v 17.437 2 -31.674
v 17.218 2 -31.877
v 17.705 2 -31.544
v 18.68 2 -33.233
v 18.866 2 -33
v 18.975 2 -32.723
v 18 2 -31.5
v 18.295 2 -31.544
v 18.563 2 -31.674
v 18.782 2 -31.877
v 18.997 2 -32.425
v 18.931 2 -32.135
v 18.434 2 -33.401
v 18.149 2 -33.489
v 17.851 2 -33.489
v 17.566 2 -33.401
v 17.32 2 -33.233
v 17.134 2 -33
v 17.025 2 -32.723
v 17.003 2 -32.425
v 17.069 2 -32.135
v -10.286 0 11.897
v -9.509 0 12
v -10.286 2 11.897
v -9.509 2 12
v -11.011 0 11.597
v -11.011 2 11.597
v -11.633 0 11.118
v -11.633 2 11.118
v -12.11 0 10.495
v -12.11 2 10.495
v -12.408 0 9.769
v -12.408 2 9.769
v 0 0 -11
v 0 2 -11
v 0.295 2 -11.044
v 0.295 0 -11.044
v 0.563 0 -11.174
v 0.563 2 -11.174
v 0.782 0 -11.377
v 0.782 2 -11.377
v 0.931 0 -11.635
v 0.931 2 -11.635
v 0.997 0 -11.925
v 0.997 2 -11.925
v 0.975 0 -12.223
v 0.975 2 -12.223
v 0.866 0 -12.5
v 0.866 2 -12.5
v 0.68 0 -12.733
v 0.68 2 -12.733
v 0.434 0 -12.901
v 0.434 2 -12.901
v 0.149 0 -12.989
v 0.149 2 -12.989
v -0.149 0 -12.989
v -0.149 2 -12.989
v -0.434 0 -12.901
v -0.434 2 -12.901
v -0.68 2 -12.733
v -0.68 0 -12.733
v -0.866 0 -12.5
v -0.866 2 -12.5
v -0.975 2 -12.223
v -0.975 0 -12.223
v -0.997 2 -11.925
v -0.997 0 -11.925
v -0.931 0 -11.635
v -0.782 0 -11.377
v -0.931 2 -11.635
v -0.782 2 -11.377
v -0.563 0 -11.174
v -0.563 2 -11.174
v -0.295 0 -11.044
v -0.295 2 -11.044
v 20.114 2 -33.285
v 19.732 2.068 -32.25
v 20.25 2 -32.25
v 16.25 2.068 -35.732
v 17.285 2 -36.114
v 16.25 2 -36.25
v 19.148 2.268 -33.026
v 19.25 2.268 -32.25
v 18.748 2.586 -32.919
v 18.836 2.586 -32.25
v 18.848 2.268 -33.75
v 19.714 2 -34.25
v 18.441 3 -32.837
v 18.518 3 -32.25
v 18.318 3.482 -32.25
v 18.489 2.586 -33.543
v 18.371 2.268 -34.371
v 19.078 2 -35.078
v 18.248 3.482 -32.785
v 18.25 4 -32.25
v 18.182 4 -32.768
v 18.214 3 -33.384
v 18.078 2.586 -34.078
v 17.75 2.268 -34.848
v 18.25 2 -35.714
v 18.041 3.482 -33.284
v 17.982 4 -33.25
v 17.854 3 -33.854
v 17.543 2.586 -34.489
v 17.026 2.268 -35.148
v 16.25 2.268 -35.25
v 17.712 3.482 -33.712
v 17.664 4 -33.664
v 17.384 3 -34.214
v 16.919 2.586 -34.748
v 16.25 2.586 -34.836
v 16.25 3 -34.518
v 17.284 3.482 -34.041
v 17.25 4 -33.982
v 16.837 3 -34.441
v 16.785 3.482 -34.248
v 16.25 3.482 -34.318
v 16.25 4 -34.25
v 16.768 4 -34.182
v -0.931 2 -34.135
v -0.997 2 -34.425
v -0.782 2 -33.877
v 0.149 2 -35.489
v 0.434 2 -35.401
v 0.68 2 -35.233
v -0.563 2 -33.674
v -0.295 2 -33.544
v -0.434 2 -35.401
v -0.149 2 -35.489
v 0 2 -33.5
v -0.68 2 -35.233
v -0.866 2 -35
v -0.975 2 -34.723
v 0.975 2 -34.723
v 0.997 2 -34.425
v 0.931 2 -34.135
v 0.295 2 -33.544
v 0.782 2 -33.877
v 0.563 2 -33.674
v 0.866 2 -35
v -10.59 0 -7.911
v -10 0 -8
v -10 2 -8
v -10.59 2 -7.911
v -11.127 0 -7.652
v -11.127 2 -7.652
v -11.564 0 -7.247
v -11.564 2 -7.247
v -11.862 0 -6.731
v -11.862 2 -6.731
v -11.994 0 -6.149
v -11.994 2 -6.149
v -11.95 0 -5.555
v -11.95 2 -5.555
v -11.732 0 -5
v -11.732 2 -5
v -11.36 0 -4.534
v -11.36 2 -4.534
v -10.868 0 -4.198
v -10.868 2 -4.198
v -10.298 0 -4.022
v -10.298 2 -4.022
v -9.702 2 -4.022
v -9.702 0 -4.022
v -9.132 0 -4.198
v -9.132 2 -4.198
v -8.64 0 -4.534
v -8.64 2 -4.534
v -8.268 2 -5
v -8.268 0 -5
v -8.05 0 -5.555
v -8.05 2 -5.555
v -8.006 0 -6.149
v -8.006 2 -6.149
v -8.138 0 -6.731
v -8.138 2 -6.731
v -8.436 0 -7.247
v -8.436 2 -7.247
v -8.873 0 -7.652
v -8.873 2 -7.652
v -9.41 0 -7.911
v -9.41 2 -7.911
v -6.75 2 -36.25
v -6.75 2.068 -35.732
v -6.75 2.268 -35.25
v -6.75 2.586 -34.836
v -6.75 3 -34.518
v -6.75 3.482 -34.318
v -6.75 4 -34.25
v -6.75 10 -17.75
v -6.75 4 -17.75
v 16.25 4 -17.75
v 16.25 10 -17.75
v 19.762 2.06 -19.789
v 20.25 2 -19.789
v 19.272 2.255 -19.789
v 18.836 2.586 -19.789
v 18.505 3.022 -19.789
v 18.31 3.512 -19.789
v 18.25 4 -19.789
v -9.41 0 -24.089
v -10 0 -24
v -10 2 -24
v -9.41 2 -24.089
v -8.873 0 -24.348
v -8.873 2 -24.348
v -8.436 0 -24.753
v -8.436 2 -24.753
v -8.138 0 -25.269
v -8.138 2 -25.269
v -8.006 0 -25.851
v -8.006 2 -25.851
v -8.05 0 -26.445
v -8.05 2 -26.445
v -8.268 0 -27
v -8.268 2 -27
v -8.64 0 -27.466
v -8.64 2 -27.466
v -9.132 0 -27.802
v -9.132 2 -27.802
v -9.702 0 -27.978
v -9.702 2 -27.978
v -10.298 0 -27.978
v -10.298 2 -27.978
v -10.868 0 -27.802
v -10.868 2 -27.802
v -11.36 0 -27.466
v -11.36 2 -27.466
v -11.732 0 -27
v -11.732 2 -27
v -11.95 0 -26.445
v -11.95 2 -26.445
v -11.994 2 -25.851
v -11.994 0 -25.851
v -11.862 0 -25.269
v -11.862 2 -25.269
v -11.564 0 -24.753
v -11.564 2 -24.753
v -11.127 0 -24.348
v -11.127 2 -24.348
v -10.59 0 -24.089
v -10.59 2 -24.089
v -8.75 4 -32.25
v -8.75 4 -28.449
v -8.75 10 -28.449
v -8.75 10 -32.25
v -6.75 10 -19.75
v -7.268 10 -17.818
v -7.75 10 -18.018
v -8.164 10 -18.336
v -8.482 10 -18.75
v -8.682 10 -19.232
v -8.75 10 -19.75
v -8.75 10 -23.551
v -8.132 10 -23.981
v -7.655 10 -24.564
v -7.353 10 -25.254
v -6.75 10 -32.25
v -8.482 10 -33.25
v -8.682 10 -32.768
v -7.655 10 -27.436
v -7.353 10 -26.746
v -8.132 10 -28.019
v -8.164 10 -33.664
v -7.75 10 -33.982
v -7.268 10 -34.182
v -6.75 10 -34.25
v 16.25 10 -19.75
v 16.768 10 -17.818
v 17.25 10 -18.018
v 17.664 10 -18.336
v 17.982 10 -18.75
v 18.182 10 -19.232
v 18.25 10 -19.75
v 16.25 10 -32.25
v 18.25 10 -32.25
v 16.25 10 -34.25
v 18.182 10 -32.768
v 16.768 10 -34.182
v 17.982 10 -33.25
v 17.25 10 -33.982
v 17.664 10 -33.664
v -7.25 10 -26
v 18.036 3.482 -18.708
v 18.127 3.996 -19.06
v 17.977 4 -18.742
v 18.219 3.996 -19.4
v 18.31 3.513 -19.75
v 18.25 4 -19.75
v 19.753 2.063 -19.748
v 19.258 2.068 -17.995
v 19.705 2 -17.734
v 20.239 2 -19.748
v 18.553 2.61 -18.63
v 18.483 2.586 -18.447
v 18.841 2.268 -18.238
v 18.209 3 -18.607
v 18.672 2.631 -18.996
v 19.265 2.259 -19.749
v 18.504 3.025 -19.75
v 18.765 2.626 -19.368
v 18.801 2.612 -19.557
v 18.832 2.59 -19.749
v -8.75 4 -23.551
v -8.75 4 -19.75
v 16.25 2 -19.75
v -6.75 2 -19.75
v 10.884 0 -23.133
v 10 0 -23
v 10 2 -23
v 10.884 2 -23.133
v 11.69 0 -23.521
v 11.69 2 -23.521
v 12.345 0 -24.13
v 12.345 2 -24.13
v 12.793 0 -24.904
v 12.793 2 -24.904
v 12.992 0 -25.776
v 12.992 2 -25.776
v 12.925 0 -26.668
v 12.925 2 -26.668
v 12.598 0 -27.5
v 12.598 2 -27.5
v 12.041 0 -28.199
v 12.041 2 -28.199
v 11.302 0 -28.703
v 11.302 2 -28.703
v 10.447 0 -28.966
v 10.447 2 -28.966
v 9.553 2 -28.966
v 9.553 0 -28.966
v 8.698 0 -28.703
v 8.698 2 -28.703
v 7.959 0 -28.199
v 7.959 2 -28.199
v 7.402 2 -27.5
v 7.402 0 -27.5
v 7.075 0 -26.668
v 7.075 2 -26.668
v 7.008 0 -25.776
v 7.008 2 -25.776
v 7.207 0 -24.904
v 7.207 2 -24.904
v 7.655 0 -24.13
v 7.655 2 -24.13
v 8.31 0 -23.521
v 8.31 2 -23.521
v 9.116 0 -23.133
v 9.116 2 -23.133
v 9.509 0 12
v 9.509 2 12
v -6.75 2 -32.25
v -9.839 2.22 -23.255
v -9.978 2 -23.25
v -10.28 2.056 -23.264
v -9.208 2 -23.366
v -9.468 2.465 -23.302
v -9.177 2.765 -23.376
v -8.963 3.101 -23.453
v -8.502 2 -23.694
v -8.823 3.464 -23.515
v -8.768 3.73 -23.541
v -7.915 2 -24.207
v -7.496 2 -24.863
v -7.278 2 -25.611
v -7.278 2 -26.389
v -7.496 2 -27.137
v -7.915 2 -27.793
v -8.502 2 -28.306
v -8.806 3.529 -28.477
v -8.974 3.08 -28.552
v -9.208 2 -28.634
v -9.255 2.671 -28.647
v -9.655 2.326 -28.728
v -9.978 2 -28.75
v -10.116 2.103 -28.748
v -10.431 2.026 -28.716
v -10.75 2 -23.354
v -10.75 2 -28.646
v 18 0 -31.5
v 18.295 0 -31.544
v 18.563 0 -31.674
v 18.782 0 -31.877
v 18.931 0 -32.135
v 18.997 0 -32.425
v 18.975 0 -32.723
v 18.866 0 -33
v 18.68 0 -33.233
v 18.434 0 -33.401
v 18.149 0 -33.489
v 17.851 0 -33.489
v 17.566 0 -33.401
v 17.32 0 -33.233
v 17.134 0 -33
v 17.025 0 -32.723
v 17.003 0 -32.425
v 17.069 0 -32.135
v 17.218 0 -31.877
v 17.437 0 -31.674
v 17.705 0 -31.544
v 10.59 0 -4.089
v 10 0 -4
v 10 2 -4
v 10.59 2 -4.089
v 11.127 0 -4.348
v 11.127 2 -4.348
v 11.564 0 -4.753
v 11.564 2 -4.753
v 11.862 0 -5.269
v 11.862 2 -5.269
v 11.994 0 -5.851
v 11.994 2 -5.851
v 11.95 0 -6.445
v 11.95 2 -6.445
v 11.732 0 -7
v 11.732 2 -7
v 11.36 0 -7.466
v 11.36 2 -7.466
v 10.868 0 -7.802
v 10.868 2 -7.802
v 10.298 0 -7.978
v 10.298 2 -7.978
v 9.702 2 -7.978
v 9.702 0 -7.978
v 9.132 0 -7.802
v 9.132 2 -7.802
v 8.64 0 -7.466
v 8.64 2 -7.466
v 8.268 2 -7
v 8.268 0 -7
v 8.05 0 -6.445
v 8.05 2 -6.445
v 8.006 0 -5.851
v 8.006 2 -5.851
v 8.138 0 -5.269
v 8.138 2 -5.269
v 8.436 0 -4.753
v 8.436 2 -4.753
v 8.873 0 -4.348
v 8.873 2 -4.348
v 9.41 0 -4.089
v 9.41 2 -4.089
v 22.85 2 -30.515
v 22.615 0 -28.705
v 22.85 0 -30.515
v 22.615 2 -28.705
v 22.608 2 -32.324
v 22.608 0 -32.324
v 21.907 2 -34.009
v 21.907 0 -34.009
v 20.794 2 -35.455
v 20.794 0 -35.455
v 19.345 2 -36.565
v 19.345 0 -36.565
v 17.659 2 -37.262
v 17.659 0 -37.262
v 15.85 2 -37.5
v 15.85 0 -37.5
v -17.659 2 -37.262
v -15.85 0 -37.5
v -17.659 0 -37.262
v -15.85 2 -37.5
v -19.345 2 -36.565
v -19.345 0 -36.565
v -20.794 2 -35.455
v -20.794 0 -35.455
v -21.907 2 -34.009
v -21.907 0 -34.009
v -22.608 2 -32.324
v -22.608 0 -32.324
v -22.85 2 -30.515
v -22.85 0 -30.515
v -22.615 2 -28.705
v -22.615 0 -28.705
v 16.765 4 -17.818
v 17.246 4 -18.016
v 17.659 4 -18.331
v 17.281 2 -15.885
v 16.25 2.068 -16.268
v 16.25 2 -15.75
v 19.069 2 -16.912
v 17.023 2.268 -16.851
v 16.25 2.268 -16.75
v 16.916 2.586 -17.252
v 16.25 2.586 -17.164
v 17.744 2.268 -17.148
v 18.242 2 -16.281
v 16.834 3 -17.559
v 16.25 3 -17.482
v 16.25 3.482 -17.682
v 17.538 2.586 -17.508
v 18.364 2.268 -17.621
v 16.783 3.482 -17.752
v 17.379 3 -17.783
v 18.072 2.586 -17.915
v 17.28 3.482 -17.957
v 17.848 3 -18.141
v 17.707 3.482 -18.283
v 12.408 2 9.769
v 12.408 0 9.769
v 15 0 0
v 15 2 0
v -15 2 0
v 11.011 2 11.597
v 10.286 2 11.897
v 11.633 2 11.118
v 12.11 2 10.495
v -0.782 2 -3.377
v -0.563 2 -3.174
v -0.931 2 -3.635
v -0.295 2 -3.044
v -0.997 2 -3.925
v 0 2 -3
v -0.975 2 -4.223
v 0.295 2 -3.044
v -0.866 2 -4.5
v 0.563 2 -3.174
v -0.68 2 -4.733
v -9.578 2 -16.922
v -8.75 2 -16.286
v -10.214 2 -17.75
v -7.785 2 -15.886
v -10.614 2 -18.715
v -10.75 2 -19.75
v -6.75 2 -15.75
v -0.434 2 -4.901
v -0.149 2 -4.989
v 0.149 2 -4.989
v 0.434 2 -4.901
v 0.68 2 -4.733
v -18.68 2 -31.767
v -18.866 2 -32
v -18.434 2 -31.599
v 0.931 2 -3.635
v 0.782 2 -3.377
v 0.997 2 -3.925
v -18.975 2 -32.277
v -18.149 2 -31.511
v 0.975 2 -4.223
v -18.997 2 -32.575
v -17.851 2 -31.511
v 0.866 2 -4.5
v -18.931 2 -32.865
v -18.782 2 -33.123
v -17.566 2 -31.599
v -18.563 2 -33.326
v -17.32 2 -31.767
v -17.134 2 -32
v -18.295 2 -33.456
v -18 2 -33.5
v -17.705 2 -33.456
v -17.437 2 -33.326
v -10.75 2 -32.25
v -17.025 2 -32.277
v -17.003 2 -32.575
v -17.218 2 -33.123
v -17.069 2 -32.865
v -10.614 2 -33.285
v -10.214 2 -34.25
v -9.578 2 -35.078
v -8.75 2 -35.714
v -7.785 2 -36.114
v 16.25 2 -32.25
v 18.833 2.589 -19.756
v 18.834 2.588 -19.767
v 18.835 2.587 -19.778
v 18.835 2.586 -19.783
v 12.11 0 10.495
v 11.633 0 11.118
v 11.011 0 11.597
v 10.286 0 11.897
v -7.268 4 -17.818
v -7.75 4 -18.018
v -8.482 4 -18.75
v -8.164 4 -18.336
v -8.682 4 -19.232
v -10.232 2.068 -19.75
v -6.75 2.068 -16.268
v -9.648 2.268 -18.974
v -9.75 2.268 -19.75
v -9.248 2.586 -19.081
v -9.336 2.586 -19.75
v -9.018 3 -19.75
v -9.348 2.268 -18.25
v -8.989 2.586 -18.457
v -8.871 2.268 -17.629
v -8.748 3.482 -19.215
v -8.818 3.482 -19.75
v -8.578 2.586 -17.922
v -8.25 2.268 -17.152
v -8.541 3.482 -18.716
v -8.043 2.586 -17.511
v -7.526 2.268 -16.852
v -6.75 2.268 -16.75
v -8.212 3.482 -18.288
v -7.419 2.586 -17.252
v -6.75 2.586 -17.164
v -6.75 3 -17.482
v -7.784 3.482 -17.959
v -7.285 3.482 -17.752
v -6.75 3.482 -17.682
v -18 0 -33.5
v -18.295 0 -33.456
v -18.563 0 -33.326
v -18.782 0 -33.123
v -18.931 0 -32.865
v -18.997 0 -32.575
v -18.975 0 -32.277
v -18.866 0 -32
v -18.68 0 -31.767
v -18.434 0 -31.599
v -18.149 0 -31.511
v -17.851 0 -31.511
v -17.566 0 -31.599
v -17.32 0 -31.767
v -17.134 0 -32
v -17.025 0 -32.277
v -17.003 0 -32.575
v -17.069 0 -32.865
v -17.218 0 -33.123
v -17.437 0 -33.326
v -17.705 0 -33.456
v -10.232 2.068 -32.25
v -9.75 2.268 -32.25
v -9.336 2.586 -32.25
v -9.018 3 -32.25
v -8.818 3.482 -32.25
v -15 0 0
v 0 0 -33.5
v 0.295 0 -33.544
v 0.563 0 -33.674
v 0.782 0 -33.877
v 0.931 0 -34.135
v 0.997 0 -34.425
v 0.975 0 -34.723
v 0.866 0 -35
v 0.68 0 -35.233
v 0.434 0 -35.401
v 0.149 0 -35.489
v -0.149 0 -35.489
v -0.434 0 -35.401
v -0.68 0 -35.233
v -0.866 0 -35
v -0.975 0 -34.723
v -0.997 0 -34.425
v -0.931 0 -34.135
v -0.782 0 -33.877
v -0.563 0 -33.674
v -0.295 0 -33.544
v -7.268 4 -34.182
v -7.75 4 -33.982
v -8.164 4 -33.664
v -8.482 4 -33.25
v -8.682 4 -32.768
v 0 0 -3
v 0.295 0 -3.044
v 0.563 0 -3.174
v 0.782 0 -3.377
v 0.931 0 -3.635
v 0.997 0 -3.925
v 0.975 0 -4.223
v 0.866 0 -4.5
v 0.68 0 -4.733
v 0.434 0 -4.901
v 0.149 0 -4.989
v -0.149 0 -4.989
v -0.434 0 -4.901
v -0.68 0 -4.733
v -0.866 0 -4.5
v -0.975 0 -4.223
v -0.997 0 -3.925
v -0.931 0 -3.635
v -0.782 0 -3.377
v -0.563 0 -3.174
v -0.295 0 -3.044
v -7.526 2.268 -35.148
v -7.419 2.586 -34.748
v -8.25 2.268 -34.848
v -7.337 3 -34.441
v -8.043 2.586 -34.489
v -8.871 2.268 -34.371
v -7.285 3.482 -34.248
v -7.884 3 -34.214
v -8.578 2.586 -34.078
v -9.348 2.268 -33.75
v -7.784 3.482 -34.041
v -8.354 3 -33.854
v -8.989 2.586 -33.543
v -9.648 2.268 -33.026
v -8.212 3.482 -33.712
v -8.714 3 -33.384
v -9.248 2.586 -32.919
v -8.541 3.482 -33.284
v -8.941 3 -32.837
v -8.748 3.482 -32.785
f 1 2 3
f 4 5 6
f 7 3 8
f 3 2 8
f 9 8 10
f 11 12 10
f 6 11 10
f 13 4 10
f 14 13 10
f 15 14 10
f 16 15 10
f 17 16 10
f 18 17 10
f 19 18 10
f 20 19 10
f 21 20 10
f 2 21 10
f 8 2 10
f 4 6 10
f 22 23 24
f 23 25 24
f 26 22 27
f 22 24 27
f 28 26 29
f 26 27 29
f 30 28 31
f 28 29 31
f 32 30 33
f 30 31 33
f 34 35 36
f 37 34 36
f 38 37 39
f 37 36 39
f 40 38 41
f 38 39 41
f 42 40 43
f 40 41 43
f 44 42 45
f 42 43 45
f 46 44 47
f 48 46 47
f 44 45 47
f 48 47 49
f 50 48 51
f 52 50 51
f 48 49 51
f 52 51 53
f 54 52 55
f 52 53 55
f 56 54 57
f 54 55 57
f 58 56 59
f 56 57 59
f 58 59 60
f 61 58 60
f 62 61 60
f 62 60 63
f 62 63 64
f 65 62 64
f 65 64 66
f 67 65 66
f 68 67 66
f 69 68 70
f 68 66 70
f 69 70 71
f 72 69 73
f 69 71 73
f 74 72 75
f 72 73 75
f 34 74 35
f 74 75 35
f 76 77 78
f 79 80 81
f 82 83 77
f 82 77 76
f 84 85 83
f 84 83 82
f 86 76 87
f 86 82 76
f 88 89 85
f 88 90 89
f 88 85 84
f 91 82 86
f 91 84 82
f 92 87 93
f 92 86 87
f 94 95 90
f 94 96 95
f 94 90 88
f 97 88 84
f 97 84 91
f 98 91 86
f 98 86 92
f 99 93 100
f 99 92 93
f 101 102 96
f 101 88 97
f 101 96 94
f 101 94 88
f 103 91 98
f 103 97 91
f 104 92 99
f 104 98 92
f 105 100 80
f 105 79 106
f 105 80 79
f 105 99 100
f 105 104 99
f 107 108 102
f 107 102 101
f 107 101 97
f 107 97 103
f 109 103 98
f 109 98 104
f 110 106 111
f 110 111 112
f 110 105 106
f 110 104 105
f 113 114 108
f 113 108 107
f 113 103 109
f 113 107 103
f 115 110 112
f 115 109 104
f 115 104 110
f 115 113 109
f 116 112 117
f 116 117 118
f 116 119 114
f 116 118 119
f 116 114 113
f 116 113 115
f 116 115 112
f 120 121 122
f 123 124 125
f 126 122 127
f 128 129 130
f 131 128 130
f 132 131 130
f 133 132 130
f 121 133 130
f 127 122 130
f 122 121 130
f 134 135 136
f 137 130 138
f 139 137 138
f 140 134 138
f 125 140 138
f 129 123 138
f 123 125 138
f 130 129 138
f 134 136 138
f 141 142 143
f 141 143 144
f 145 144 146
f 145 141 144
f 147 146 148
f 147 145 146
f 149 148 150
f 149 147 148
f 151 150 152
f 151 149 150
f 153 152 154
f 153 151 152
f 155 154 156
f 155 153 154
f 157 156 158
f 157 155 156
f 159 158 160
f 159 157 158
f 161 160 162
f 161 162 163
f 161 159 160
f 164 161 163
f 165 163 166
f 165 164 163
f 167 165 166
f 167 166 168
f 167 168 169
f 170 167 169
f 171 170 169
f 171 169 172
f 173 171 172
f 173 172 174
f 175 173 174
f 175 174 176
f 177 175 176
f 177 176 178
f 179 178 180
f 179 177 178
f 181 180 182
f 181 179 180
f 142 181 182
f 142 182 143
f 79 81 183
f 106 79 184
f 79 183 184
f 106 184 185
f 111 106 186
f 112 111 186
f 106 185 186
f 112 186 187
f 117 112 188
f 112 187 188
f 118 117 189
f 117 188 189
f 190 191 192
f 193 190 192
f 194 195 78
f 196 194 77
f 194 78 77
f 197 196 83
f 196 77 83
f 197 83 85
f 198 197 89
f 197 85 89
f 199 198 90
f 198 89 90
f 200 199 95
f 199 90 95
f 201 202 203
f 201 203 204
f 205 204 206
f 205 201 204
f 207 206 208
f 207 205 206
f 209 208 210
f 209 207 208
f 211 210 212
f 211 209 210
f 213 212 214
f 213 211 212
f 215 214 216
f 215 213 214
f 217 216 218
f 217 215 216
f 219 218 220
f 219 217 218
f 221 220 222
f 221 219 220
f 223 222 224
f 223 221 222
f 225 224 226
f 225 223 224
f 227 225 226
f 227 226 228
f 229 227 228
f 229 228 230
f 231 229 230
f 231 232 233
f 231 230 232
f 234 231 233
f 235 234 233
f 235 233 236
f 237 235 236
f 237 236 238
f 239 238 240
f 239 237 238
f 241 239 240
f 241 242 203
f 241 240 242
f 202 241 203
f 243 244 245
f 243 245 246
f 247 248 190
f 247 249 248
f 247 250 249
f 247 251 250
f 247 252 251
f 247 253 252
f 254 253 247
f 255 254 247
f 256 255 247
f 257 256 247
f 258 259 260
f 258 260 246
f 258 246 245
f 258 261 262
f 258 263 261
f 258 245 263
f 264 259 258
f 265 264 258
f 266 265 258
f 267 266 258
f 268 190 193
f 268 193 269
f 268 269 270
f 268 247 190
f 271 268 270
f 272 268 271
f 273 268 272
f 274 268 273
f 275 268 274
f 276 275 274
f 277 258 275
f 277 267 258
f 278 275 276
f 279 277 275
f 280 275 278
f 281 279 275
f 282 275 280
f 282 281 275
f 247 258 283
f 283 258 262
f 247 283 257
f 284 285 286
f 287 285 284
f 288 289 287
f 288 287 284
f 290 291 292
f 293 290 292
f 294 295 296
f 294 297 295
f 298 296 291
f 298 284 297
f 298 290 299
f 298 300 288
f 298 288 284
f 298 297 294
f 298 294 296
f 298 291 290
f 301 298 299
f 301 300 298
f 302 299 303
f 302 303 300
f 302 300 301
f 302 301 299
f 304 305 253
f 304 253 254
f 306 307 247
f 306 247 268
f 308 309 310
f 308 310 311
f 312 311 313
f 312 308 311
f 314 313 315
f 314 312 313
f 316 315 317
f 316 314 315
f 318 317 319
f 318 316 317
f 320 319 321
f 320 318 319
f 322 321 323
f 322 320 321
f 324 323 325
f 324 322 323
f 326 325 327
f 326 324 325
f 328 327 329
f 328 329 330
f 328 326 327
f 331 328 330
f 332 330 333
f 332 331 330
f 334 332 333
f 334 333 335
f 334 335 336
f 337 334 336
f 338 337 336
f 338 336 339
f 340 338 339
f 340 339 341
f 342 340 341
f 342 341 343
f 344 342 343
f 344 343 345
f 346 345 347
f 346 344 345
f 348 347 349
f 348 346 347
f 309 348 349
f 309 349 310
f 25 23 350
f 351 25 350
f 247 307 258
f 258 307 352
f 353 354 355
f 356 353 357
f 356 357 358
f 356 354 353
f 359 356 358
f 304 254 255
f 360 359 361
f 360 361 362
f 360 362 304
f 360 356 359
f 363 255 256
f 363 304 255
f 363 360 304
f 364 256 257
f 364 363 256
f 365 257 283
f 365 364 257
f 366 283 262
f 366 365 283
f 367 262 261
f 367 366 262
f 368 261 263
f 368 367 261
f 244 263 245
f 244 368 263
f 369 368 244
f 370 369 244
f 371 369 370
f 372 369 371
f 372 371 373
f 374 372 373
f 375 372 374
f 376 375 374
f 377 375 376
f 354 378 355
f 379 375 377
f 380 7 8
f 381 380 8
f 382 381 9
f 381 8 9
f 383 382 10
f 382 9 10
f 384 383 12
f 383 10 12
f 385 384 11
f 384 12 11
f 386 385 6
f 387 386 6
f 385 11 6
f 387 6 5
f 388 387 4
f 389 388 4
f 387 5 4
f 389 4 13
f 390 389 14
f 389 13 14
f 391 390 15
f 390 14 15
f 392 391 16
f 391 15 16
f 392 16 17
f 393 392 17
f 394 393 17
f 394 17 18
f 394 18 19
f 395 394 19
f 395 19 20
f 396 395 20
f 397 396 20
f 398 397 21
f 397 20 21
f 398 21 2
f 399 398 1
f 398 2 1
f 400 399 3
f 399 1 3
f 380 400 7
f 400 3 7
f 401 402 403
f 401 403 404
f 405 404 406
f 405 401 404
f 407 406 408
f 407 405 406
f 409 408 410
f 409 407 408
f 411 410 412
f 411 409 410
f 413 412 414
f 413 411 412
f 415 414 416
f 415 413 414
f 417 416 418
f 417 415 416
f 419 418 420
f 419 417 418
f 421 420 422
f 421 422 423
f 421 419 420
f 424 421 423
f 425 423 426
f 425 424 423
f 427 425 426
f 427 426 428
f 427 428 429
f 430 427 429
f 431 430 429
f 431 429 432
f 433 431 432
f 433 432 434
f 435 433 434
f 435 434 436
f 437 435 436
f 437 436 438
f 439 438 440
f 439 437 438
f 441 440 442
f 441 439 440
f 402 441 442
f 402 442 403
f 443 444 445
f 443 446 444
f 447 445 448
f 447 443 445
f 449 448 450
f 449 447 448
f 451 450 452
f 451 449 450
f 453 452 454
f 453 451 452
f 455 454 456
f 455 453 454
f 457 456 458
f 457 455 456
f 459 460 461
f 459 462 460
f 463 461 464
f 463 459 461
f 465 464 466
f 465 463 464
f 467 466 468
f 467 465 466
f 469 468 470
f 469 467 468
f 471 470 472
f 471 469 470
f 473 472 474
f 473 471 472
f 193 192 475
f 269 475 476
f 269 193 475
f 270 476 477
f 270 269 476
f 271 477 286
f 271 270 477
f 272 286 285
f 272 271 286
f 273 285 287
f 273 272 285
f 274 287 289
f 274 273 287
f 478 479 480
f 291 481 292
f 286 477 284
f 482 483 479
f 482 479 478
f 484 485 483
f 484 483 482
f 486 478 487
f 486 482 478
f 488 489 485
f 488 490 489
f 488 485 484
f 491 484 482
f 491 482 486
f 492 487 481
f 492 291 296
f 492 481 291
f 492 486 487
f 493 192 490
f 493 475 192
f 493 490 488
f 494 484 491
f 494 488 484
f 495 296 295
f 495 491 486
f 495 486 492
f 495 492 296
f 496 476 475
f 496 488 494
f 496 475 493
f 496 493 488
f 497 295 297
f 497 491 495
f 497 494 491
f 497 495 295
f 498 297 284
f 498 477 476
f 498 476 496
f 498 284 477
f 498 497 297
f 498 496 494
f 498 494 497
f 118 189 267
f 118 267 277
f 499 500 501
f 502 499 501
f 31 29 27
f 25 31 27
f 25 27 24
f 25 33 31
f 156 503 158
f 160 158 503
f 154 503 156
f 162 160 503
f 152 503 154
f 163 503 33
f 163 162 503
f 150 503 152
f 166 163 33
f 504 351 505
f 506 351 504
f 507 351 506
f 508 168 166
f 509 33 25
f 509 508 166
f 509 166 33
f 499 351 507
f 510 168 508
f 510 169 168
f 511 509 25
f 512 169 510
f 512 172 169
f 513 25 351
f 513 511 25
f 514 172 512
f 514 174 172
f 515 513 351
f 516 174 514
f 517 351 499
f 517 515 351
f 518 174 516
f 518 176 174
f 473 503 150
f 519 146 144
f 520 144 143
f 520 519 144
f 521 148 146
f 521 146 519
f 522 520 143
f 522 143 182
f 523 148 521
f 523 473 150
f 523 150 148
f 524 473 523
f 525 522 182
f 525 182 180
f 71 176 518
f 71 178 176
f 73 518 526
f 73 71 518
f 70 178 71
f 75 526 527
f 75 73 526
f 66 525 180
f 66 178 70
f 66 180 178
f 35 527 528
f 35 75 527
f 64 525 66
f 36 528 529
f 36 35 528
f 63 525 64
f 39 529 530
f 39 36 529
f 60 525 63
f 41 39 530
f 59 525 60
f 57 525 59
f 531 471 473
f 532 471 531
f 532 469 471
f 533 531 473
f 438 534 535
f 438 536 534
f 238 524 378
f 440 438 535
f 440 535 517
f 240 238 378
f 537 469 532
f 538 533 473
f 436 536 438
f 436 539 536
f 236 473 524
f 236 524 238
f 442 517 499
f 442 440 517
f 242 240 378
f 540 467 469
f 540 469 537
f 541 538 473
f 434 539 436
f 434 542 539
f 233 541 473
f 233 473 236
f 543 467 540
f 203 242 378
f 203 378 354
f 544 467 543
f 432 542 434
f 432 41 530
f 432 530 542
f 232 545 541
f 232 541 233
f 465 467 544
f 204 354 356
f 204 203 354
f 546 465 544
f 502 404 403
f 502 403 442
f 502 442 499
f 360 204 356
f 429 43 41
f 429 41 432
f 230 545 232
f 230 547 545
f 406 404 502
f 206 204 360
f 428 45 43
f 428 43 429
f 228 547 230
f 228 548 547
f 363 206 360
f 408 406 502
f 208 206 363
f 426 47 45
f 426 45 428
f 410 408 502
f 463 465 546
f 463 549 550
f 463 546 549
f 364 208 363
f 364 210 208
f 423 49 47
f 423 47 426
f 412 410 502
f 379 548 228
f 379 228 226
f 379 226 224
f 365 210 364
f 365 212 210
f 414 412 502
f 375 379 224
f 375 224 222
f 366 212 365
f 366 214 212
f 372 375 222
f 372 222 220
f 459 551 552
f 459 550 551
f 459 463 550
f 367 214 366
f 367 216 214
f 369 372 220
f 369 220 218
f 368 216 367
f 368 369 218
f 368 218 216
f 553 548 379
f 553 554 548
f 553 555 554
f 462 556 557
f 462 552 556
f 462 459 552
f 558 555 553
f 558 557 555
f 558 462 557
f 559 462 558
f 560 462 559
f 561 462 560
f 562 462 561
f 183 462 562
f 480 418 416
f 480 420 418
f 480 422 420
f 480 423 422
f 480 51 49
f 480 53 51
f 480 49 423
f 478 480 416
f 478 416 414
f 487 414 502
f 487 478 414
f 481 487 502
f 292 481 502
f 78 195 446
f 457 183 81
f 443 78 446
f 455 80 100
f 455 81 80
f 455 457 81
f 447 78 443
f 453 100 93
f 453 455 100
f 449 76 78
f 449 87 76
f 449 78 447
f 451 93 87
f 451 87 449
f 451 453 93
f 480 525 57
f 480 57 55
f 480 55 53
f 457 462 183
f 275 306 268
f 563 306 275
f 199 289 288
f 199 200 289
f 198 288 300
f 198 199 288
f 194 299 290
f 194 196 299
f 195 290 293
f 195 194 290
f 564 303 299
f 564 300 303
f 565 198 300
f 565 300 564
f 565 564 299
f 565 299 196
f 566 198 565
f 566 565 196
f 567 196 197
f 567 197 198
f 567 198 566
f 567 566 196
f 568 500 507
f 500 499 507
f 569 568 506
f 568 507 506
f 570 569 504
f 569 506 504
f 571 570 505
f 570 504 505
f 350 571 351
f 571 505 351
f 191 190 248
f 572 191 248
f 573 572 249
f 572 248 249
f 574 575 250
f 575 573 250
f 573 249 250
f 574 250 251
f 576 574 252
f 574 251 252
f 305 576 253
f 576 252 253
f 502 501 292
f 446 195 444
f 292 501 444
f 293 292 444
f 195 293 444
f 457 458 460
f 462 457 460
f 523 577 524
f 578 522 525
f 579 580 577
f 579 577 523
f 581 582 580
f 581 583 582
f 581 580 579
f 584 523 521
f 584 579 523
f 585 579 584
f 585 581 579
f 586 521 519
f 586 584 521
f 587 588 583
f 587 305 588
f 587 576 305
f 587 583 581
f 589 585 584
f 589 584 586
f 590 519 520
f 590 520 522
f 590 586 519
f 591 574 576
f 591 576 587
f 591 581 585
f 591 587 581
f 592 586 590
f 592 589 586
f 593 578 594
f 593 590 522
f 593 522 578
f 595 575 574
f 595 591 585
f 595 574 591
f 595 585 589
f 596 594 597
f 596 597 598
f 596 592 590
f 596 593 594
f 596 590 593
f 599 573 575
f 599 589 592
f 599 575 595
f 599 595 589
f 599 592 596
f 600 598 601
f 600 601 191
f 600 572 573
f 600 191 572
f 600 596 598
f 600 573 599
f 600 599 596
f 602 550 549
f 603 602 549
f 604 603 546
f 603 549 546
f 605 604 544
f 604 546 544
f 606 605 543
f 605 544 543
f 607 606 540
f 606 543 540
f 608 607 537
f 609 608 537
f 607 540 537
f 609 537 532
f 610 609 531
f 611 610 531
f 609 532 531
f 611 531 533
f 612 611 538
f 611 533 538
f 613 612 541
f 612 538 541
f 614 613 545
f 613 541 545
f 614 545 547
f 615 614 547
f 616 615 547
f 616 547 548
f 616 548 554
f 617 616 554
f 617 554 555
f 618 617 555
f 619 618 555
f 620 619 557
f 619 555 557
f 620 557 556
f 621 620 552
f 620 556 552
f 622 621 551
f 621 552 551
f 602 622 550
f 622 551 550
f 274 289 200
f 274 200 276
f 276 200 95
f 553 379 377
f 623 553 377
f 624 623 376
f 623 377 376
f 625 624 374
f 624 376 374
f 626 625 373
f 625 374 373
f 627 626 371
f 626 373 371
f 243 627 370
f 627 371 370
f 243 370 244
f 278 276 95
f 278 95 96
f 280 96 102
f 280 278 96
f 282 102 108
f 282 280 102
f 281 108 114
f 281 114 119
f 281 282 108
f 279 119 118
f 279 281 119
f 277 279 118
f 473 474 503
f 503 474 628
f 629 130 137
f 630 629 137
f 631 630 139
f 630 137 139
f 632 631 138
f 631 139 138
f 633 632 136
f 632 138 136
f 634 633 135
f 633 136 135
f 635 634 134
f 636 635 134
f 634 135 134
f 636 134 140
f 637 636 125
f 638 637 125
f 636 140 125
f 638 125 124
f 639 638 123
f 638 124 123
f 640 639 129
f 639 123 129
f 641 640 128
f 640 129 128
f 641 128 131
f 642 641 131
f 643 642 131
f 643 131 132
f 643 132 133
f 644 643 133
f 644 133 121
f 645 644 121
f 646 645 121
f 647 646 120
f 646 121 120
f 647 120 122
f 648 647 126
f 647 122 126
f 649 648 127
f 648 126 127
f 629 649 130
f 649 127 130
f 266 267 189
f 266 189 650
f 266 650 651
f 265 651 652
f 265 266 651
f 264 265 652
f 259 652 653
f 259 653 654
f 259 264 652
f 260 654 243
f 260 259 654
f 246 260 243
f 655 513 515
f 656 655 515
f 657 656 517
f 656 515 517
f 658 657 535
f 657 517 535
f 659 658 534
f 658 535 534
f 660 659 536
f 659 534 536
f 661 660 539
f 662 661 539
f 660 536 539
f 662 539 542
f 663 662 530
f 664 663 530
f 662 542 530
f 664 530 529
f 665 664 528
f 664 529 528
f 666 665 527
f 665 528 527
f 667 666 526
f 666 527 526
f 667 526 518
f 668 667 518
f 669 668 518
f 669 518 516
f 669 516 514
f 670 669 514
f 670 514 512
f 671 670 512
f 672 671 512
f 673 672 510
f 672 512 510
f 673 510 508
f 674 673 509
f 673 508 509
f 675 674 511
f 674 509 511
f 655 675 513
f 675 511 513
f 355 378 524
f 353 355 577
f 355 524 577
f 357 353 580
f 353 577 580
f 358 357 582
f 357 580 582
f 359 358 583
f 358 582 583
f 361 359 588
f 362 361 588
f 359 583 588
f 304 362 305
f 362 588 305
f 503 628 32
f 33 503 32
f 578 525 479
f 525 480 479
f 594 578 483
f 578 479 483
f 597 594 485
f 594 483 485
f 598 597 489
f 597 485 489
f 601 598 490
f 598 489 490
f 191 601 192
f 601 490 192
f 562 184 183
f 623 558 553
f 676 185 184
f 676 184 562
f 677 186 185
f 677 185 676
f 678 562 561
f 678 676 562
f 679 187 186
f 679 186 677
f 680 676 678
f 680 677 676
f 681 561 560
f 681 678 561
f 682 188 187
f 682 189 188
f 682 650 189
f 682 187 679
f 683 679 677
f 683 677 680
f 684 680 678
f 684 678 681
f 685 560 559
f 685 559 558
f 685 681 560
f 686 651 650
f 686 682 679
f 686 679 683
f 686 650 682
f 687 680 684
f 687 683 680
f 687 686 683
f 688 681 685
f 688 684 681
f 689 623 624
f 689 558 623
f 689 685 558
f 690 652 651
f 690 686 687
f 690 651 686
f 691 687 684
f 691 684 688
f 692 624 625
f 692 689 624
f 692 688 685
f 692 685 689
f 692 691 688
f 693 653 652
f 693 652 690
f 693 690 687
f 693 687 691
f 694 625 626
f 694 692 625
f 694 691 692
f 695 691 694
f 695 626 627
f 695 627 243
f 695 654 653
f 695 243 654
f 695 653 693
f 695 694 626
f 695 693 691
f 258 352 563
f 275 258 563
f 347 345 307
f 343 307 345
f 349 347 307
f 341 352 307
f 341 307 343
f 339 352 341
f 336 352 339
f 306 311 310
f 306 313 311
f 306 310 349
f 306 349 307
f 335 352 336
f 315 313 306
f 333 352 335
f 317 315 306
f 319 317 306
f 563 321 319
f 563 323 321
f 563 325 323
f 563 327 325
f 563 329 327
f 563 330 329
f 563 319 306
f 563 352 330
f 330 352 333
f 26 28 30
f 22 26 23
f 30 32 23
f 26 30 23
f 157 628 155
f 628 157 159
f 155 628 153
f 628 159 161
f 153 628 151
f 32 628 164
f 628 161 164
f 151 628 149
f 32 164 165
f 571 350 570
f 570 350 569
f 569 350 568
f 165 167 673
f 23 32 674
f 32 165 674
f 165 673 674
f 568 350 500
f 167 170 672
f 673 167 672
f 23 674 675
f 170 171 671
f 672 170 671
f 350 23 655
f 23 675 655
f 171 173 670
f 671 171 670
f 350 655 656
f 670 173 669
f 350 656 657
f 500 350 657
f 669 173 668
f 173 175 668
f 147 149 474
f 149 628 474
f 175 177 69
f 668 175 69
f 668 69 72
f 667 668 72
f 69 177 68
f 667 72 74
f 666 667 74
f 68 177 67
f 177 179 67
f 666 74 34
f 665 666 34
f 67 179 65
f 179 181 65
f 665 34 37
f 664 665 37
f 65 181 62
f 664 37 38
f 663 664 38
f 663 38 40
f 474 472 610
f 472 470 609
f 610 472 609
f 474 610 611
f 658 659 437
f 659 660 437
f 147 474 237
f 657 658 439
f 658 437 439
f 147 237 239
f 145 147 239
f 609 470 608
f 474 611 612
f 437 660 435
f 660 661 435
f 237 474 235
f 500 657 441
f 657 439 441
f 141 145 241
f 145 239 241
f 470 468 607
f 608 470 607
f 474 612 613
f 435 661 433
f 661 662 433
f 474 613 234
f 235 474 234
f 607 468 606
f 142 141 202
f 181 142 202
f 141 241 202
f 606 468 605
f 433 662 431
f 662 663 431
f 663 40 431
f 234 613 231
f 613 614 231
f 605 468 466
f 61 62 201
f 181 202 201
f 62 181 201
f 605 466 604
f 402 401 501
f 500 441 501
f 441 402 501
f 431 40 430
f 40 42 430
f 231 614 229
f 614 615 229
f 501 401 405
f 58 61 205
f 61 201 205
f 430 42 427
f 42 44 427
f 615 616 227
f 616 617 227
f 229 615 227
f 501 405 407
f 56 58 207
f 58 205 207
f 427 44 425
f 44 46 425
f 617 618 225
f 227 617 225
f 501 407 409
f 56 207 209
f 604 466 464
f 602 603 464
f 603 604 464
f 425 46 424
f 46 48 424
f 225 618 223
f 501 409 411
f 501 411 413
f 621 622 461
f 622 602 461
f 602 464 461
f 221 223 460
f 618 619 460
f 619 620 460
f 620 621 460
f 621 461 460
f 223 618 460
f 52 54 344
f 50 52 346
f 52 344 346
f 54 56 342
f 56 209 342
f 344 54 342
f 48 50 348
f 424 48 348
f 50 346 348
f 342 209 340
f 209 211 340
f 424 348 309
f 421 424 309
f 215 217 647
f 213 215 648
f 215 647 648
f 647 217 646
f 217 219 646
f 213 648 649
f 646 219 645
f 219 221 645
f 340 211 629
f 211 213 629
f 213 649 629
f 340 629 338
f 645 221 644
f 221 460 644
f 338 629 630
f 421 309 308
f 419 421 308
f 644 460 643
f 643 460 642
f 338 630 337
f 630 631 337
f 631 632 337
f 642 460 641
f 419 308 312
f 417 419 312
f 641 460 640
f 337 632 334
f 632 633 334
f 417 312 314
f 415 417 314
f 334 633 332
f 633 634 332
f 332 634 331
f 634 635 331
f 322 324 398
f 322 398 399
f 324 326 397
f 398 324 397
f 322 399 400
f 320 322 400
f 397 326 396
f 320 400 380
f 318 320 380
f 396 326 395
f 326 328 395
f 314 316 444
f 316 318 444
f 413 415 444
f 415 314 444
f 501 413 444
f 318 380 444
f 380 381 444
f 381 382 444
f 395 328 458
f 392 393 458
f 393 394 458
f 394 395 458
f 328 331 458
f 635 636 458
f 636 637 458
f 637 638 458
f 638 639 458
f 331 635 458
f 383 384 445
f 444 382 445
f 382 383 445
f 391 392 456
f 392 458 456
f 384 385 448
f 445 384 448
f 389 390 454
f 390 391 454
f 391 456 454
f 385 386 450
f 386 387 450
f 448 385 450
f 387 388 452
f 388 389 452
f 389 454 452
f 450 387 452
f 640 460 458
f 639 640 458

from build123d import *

# Parameters (mm, degrees)
SKETCH1_R               = 3
SKETCH1_R_2             = 2
BOSS_EXTRUDE1_DEPTH     = 2
FILLET1_R               = 7
SKETCH3_W               = 27
SKETCH3_H               = 16.5
SKETCH3_W_2             = 23
SKETCH3_H_2             = 12.5
BOSS_EXTRUDE2_DEPTH     = 8
FILLET2_R               = 2
FILLET3_R               = 2
SKETCH2_R               = 1
CUT_EXTRUDE1_DEPTH      = 2
CUT_EXTRUDE2_DEPTH      = 45.635758586
CUT_EXTRUDE2_DEPTH_BACK = 45.635758586
SKETCH4_R               = 2
SKETCH5_R               = 2.75
CUT_EXTRUDE3_DEPTH      = 45.635758586
FILLET4_R               = 3


with BuildPart() as part:
    # Sketch1 → Boss-Extrude1 (new body)
    with BuildSketch(Plane(origin=(0, 0, 0), x_dir=(1, 0, 0), z_dir=(0, 1, 0))):
        Polygon((15, 0), (24.948794511, 37.5), (-24.948794511, 37.5), (-15, 0), (-11.816385757, -12), (11.816385757, -12), align=None)
        with Locations(Location((10, 26, 0), (0, 0, 270))):
            Circle(SKETCH1_R, mode=Mode.SUBTRACT)
        with Locations(Location((10, 6, 0), (0, 0, 270))):
            Circle(SKETCH1_R_2, mode=Mode.SUBTRACT)
        with Locations(Location((-10, 6, 0), (0, 0, 90))):
            Circle(SKETCH1_R_2, mode=Mode.SUBTRACT)
    extrude(amount=BOSS_EXTRUDE1_DEPTH)

    # Fillet1
    fillet1_edges = [part.edges().sort_by_distance(p)[0] for p in [
        (-24.948794511, 1, -37.5),
        (24.948794511, 1, -37.5),
    ]]
    fillet(fillet1_edges, radius=FILLET1_R)

    # Sketch3 → Boss-Extrude2 (add)
    with BuildSketch(Plane(origin=(0, 2, 0), x_dir=(1, 0, 0), z_dir=(0, 1, 0))):
        with Locations((4.75, 26)):
            Rectangle(SKETCH3_W, SKETCH3_H)
        with Locations((4.75, 26)):
            Rectangle(SKETCH3_W_2, SKETCH3_H_2, mode=Mode.SUBTRACT)
    extrude(amount=BOSS_EXTRUDE2_DEPTH)

    # Fillet2
    fillet2_edges = [part.edges().sort_by_distance(p)[0] for p in [
        (-8.75, 6, -34.25),
        (-8.75, 6, -17.75),
        (18.25, 6, -17.75),
        (18.25, 6, -34.25),
    ]]
    fillet(fillet2_edges, radius=FILLET2_R)

    # Fillet3
    fillet3_edges = [part.edges().sort_by_distance(p)[0] for p in [
        (4.75, 2, -17.75),
        (-8.75, 2, -26),
        (18.25, 2, -26),
        (4.75, 2, -34.25),
        (-8.164213562, 2, -18.335786438),
        (17.664213562, 2, -18.335786438),
        (17.664213562, 2, -33.664213562),
        (-8.164213562, 2, -33.664213562),
    ]]
    fillet(fillet3_edges, radius=FILLET3_R)

    # Sketch2 → Cut-Extrude1 (cut)
    with BuildSketch(Plane(origin=(0, 2, 0), x_dir=(1, 0, 0), z_dir=(0, 1, 0))):
        with Locations(Location((0, 34.5, 0), (0, 0, 270))):
            Circle(SKETCH2_R)
        with Locations(Location((18, 32.5, 0), (0, 0, 270))):
            Circle(SKETCH2_R)
        with Locations(Location((0, 4, 0), (0, 0, 270))):
            Circle(SKETCH2_R)
        with Locations(Location((0, 12, 0), (0, 0, 270))):
            Circle(SKETCH2_R)
        with Locations(Location((-18, 32.5, 0), (0, 0, 90))):
            Circle(SKETCH2_R)
    extrude(amount=-CUT_EXTRUDE1_DEPTH, mode=Mode.SUBTRACT)

    # Sketch4 → Cut-Extrude2 (cut, two sides: drawn at the far end of the back side and taken through both)
    with BuildSketch(Plane(origin=(0, 2, 0), x_dir=(1, 0, 0), z_dir=(0, 1, 0)).offset(-CUT_EXTRUDE2_DEPTH_BACK)):
        with Locations(Location((-10, 26, 0), (0, 0, 270))):
            Circle(SKETCH4_R)
    extrude(amount=CUT_EXTRUDE2_DEPTH + CUT_EXTRUDE2_DEPTH_BACK, mode=Mode.SUBTRACT)

    # Sketch5 → Cut-Extrude3 (cut, through all)
    with BuildSketch(Plane(origin=(0, 2, 0), x_dir=(1, 0, 0), z_dir=(0, 1, 0))):
        with Locations((-10, 26)):
            Circle(SKETCH5_R)
    extrude(amount=CUT_EXTRUDE3_DEPTH, mode=Mode.SUBTRACT)

    # Fillet4
    fillet4_edges = [part.edges().sort_by_distance(p)[0] for p in [
        (11.816385757, 1, 12),
        (-11.816385757, 1, 12),
    ]]
    fillet(fillet4_edges, radius=FILLET4_R)


solid = part.part
